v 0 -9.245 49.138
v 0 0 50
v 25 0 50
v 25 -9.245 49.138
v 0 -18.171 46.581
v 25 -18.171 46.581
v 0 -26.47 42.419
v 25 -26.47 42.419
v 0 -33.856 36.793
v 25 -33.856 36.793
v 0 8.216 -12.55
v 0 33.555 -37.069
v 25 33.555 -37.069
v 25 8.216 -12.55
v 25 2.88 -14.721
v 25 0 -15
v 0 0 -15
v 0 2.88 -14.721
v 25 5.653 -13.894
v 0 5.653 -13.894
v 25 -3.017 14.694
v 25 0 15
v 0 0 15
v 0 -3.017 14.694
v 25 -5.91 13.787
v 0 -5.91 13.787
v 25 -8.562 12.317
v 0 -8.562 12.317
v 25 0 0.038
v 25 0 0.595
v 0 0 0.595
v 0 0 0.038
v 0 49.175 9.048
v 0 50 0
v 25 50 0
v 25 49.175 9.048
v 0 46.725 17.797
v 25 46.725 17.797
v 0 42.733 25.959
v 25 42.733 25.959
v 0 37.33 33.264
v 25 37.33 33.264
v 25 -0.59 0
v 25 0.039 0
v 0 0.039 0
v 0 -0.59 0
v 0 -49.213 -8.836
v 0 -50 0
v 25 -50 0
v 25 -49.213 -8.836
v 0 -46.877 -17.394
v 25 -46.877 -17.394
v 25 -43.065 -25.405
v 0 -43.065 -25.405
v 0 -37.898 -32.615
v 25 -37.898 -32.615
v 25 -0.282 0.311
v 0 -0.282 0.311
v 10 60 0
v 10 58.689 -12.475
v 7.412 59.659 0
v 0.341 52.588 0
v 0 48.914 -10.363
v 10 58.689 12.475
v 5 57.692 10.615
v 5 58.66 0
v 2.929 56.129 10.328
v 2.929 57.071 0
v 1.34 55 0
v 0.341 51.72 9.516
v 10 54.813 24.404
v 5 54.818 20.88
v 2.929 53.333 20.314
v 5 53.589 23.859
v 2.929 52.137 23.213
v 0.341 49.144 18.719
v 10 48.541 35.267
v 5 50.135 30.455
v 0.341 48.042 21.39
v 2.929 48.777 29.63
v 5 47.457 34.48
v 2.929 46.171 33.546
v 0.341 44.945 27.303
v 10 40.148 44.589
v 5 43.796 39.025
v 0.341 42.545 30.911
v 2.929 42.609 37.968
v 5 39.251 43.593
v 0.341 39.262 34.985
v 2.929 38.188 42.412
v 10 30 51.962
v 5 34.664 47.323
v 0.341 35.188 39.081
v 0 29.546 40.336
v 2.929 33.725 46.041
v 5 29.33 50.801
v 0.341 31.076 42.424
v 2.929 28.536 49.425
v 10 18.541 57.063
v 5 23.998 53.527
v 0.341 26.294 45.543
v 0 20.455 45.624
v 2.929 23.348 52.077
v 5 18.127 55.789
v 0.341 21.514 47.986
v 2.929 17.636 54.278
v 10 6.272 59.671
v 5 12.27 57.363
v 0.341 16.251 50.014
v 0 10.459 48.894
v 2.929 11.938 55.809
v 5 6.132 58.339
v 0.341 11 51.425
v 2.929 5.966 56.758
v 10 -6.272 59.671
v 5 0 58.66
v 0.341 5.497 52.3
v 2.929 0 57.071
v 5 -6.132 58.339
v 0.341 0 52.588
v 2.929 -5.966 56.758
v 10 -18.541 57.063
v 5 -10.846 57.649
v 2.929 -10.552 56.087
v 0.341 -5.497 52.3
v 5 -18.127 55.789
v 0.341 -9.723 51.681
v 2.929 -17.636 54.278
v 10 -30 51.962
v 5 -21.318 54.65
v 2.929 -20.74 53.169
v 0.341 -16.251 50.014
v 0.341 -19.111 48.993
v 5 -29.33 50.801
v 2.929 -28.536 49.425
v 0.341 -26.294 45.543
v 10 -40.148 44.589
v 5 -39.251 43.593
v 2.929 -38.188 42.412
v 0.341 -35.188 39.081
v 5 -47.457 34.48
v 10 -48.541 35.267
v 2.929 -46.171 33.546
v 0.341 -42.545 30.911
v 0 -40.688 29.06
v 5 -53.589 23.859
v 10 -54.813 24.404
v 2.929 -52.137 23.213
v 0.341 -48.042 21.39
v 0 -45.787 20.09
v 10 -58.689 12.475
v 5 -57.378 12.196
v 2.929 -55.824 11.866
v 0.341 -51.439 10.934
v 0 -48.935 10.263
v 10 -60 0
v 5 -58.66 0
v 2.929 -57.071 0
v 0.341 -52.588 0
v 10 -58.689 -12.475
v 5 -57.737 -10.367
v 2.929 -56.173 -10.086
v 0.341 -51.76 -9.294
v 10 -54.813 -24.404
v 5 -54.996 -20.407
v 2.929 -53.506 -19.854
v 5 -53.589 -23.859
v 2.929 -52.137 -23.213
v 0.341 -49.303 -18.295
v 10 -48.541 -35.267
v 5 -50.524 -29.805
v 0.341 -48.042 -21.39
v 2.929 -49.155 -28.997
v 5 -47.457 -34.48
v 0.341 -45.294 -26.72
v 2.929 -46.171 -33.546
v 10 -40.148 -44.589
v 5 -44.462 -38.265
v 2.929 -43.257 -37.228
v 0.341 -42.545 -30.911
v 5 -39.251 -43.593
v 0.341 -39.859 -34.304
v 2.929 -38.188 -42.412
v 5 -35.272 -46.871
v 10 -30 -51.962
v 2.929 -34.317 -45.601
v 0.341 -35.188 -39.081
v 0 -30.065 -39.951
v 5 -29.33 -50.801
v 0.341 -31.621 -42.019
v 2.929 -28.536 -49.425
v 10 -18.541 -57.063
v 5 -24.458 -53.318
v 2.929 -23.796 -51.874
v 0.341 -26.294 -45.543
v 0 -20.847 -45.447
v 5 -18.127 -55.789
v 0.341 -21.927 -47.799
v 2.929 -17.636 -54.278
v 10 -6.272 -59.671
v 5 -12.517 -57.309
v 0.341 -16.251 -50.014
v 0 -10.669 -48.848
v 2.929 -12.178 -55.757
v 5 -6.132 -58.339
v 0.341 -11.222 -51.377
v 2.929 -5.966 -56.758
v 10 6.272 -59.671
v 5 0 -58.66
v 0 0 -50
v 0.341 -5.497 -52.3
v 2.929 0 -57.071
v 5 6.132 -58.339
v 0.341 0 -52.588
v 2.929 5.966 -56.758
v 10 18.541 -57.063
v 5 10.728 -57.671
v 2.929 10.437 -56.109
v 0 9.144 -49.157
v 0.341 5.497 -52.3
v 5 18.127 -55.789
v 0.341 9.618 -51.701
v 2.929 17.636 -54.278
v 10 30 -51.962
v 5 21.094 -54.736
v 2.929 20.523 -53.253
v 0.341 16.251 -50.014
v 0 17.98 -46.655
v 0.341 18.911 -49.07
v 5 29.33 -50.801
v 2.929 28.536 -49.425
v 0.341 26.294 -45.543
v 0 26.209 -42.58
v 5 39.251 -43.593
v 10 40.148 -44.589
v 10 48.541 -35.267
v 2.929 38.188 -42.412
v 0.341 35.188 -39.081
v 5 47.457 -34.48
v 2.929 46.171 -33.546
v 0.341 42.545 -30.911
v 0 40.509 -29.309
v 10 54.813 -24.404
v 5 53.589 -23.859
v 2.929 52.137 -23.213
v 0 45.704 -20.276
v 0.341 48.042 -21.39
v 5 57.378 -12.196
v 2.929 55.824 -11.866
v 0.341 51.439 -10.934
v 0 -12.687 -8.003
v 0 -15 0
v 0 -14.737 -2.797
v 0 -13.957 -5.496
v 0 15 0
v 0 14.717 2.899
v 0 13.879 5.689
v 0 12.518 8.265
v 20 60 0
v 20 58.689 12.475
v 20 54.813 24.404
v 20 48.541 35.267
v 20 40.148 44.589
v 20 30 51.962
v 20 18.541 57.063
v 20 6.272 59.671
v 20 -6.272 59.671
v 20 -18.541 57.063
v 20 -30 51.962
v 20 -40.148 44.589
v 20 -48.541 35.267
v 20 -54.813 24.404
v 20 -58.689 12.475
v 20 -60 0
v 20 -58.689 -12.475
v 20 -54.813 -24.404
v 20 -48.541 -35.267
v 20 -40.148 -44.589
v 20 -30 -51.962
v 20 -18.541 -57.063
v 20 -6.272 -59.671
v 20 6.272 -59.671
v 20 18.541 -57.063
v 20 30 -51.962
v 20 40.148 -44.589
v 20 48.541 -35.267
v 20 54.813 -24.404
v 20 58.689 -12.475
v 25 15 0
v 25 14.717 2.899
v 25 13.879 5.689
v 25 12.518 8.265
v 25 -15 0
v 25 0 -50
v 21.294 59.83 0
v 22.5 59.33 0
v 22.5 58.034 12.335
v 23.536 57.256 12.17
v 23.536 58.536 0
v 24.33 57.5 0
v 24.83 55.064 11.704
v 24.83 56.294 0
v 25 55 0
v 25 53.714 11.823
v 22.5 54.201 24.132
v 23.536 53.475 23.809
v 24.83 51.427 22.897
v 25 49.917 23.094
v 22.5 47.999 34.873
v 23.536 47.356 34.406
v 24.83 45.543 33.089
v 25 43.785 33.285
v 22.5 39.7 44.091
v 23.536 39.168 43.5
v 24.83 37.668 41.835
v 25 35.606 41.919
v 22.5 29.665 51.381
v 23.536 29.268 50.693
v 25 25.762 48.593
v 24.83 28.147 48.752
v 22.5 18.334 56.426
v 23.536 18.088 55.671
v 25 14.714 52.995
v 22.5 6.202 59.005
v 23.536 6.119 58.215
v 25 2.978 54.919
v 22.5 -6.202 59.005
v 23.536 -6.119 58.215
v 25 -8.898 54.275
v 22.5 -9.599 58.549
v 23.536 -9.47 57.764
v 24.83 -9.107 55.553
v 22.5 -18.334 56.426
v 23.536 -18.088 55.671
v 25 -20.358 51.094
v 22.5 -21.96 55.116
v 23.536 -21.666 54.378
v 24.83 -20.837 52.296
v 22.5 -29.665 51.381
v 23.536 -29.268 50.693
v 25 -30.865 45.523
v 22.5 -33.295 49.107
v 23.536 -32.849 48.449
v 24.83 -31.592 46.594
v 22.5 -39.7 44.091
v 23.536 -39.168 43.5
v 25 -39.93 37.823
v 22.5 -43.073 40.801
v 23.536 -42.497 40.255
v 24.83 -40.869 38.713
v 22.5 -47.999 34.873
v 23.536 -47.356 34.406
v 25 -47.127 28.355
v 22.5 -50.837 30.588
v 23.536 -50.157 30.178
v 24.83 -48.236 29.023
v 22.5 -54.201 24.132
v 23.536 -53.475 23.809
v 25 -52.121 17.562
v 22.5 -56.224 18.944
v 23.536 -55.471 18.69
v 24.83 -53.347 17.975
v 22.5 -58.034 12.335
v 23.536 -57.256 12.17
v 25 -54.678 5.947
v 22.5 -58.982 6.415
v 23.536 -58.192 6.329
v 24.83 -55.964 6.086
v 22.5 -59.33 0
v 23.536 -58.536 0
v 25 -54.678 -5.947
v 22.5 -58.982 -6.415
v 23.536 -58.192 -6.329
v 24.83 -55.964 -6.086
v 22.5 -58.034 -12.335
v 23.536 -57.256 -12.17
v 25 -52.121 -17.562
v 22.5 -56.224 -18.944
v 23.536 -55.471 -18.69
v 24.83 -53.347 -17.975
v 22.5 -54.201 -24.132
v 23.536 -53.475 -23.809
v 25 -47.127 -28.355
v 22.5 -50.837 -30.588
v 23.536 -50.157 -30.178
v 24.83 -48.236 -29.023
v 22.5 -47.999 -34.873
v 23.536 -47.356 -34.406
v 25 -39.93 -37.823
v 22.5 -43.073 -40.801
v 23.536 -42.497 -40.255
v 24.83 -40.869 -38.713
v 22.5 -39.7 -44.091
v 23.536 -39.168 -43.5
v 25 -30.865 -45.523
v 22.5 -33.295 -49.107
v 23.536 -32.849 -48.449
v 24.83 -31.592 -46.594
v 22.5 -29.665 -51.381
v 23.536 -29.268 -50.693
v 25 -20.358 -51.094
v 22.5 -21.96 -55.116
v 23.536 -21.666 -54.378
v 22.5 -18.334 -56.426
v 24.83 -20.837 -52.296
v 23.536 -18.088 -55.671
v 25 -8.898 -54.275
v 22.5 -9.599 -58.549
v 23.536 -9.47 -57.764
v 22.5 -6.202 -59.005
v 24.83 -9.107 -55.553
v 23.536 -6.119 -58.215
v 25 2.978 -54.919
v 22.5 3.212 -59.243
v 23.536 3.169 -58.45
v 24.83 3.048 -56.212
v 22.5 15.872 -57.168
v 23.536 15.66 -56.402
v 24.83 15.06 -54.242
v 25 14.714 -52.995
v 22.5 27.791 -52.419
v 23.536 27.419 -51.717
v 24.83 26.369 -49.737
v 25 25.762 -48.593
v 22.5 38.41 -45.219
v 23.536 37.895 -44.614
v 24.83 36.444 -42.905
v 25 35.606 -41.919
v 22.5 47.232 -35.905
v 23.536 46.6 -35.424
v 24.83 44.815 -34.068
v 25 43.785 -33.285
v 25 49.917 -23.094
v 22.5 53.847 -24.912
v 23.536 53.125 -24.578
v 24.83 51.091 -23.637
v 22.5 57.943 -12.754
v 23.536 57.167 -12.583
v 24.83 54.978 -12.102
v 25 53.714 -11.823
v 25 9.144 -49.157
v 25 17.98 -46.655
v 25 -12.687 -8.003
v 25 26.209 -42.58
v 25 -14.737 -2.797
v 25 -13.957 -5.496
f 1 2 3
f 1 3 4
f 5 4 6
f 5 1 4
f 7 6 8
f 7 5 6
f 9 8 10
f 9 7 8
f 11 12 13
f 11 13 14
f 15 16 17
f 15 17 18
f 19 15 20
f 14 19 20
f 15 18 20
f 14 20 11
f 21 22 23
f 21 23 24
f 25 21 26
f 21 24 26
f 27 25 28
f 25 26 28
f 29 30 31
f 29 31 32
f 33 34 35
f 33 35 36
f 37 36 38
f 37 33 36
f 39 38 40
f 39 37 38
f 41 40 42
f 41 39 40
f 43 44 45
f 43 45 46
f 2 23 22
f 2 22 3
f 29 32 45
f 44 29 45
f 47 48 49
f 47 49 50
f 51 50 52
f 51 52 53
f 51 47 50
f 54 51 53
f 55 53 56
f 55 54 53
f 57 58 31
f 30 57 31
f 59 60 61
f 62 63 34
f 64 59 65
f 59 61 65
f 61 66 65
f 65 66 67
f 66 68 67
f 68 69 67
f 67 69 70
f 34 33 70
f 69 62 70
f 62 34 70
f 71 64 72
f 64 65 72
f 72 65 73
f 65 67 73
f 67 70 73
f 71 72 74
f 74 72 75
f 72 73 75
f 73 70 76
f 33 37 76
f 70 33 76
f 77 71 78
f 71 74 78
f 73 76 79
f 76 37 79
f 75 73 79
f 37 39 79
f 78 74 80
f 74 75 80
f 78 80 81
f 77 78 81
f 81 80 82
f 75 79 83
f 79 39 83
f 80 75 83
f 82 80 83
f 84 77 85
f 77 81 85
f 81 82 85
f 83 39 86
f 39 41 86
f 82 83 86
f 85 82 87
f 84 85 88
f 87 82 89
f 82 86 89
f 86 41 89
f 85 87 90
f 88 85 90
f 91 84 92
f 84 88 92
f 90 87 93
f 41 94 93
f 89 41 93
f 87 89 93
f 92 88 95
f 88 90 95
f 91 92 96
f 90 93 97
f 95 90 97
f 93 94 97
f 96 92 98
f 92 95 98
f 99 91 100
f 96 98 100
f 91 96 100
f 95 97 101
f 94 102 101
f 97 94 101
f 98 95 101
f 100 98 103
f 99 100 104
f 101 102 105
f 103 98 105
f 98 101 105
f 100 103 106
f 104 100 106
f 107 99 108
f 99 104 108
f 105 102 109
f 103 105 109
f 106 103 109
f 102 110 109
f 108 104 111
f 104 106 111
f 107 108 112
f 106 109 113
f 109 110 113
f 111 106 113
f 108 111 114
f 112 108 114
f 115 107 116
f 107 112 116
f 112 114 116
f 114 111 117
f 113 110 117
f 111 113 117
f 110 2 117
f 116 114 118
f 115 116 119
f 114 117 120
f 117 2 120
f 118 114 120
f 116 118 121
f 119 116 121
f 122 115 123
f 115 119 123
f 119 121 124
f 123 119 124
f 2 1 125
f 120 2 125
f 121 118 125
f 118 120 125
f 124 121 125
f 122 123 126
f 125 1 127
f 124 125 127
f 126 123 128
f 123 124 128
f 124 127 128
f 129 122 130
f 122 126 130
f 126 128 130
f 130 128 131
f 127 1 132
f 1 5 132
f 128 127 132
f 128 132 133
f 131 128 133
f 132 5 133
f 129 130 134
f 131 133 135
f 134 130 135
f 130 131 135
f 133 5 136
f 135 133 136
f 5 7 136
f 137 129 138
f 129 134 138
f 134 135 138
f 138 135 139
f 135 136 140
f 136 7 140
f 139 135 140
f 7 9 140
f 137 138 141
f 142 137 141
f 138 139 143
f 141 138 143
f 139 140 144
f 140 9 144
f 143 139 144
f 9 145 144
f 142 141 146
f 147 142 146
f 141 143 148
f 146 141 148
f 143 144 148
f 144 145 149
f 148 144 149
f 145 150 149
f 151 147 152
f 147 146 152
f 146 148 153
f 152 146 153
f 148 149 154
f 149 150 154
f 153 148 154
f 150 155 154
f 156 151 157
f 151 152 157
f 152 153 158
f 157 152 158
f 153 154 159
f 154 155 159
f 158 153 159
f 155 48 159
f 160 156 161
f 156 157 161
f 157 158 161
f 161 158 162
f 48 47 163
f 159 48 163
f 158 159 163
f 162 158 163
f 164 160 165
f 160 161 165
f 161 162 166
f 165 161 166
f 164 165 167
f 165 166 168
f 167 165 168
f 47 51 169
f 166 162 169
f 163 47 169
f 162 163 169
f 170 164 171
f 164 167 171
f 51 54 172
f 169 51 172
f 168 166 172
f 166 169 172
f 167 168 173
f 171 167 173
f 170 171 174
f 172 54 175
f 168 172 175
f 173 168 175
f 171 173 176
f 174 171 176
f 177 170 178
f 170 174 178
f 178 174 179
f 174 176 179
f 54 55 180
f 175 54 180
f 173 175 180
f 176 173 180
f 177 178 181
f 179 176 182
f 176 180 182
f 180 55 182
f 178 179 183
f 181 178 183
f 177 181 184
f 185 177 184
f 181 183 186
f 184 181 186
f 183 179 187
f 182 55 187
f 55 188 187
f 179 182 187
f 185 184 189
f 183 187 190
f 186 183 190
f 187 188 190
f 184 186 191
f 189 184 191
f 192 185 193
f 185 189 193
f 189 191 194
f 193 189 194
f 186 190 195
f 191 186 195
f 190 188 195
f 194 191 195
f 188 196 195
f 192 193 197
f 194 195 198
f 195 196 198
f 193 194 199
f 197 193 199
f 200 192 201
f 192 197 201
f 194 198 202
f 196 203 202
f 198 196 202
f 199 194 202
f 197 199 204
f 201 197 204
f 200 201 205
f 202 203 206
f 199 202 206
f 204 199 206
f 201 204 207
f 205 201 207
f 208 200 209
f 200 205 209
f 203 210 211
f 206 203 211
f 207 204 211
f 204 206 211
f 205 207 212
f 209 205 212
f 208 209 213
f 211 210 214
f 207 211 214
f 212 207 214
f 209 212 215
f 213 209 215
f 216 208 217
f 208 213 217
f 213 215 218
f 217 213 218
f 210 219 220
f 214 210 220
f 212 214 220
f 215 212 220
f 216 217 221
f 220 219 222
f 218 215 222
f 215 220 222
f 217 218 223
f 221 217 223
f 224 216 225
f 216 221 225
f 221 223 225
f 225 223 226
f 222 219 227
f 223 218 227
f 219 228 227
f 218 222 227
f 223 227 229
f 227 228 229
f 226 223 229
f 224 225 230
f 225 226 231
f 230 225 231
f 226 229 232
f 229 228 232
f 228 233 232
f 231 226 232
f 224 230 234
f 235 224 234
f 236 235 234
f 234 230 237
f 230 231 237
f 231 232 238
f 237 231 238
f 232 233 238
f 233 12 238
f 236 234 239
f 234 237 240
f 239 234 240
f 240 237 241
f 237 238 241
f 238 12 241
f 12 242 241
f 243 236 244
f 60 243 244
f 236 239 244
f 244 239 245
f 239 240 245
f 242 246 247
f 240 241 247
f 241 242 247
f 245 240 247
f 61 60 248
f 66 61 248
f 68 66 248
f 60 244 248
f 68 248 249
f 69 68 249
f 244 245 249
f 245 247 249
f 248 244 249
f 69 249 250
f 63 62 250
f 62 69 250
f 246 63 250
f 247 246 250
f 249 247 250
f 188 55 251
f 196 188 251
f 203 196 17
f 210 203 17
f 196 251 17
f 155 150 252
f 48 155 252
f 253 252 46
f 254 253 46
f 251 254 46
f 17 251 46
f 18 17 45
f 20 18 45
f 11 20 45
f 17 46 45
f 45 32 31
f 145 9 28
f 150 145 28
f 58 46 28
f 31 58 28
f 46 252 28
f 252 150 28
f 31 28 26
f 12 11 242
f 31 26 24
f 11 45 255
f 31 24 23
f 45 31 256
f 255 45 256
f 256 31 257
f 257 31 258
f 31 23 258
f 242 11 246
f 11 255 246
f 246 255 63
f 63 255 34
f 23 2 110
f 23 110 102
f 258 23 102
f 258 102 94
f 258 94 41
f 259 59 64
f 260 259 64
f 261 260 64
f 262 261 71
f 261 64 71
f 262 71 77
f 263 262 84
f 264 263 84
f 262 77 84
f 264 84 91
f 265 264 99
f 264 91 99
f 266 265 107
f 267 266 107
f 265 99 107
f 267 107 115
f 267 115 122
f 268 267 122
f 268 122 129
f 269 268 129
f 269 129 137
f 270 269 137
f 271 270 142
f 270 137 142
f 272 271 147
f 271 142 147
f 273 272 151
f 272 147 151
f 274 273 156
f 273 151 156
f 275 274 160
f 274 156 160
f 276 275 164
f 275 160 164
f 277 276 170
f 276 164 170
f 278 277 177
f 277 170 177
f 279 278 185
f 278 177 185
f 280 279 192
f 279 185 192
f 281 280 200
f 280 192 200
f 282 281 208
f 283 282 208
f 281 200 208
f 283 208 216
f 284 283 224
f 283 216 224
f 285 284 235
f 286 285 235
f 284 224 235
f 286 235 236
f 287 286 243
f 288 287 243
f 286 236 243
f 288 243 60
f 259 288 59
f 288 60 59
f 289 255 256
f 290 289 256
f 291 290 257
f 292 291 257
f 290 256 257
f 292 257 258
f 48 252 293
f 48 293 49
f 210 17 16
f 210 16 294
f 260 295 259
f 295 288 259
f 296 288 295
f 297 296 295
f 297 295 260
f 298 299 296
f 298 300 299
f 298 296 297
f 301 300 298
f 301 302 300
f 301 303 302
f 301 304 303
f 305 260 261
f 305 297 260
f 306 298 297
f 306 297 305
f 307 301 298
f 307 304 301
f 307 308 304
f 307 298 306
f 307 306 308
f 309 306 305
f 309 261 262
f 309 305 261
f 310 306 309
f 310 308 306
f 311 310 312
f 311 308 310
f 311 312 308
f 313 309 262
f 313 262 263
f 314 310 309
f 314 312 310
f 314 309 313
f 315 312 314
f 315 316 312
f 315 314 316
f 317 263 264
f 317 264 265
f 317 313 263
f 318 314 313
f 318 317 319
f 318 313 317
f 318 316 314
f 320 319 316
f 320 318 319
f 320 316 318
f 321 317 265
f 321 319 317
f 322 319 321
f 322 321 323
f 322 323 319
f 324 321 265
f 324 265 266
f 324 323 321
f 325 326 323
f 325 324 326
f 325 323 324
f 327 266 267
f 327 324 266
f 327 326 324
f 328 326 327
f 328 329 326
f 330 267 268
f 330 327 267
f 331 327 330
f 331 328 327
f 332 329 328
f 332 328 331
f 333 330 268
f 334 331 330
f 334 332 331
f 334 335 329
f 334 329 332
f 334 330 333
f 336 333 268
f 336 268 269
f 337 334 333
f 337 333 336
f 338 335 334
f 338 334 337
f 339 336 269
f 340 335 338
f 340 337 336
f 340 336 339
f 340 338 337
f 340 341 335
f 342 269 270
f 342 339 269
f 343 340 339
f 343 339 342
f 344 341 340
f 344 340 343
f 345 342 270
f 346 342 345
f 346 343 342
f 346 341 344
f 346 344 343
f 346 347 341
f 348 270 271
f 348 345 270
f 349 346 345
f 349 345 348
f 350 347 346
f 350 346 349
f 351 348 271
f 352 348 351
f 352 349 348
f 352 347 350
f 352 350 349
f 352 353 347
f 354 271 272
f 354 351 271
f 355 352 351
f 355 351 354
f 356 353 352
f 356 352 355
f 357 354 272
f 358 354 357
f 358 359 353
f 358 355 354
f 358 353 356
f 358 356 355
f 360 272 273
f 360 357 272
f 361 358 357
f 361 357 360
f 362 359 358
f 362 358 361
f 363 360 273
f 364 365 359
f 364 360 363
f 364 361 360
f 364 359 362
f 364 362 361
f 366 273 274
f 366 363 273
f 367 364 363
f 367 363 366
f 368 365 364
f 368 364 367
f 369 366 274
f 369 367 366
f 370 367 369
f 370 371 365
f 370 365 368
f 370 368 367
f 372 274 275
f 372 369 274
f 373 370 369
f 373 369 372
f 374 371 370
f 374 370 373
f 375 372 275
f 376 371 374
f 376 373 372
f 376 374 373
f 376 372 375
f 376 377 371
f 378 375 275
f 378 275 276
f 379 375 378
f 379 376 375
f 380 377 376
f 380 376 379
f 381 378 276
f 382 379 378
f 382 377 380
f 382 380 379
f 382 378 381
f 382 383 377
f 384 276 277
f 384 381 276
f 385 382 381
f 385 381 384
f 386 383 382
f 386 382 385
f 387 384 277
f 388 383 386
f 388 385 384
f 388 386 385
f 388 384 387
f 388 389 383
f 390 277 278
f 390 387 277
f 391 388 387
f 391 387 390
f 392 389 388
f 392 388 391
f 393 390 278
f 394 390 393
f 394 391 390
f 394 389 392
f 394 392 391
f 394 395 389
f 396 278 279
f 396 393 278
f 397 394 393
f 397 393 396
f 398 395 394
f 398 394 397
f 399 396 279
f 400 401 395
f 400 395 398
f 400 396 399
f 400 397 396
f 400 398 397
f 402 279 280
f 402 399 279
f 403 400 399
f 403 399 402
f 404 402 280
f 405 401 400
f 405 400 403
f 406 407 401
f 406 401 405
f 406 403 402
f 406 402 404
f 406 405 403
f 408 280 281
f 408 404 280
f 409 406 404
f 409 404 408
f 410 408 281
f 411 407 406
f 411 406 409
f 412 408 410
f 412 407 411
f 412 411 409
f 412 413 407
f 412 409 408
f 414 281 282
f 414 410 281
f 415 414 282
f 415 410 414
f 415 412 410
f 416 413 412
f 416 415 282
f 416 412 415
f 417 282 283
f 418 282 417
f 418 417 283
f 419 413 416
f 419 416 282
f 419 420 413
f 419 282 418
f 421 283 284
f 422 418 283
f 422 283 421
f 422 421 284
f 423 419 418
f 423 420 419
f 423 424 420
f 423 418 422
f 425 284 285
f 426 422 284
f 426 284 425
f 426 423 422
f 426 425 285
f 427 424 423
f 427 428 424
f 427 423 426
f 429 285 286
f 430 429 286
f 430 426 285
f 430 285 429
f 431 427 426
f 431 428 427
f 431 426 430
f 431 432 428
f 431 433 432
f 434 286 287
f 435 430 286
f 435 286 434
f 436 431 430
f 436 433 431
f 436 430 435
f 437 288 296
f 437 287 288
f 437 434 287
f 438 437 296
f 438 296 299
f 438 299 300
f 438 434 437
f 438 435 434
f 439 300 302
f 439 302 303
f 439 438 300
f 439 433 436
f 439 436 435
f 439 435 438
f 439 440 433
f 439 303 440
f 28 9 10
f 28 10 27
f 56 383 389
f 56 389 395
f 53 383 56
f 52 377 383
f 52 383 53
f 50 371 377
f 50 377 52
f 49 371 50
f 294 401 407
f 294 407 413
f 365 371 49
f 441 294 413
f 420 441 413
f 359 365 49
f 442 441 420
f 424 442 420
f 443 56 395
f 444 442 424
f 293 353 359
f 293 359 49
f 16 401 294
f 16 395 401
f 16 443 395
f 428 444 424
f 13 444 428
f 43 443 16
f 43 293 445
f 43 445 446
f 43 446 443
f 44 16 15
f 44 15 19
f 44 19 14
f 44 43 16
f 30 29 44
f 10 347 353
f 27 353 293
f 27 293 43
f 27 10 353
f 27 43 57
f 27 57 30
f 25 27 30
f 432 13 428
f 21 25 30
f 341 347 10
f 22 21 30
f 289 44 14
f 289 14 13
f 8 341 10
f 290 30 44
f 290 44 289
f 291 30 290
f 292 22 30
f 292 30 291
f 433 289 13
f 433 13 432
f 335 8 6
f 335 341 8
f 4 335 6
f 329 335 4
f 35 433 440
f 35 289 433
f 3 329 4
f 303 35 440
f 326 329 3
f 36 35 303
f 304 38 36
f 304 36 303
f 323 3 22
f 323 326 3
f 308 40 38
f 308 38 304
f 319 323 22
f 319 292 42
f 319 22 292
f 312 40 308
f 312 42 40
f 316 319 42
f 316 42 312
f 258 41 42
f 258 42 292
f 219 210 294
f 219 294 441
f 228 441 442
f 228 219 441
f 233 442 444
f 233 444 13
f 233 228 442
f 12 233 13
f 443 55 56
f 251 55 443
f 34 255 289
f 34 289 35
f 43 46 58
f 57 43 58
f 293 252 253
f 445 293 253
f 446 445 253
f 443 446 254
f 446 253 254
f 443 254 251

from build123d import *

# Parameters (mm, degrees)
F0_R     = 60
F0_R_2   = 55
F1_DEPTH = 25
F2_R     = 5
F3_R     = 10
F4_DEPTH = 25
F5_DEPTH = 25


with BuildPart() as f1:
    # F0 (on Right) → F1 (new body)
    with BuildSketch(Plane.YZ):
        Circle(F0_R)
        Circle(F0_R_2, mode=Mode.SUBTRACT)
        Circle(F0_R_2)
        with BuildLine():
            ThreePointArc((37.3300225605, 33.2636350333), (46.7252668694, 17.7974558852), (50, 0))
            ThreePointArc((50, 0), (46.3547535543, -18.7413132657), (35.9505270831, -34.7499583085))
            ThreePointArc((35.9505270831, -34.7499583085), (34.7719029265, -35.9293023432), (33.5546123129, -37.0686928894))
            ThreePointArc((33.5546123129, -37.0686928894), (17.9800633415, -46.6553032595), (0, -50))
            ThreePointArc((0, -50), (-19.2409733878, -46.1495930978), (-35.5185237062, -35.1913977235))
            ThreePointArc((-35.5185237062, -35.1913977235), (-36.7306636988, -33.9243031505), (-37.8976277369, -32.6154842355))
            ThreePointArc((-37.8976277369, -32.6154842355), (-46.8768673593, -17.3942319916), (-50, 0))
            ThreePointArc((-50, 0), (-46.3446390349, 18.7663111114), (-35.9130226909, 34.7887165789))
            ThreePointArc((-35.9130226909, 34.7887165789), (-34.8991240146, 35.8057417605), (-33.8564359237, 36.7932296292))
            ThreePointArc((-33.8564359237, 36.7932296292), (-18.1705602354, 46.5814420207), (0, 50))
            ThreePointArc((0, 50), (1.5278005192, 49.9766528048), (3.054174244, 49.9066330229))
            ThreePointArc((3.054174244, 49.9066330229), (20.2598113498, 45.7114870035), (34.923788683, 35.7816850362))
            ThreePointArc((34.923788683, 35.7816850362), (36.148837516, 34.5436180248), (37.3300225605, 33.2636350333))
        make_face(mode=Mode.SUBTRACT)
        with BuildLine():
            ThreePointArc((-35.5185237062, -35.1913977235), (-19.2409733878, -46.1495930978), (0, -50))
            Line((0, -50), (0, -15))
            ThreePointArc((0, -15), (-5.9073859905, -13.7877768607), (-10.8599626488, -10.347038768))
            Line((-10.8599626488, -10.347038768), (-35.5185237062, -35.1913977235))
        make_face()
        with BuildLine():
            Line((-10.7607644181, 10.4501650292), (-35.9130226909, 34.7887165789))
            ThreePointArc((-35.9130226909, 34.7887165789), (-46.3446390349, 18.7663111114), (-50, 0))
            Line((-50, 0), (-15, 0))
            ThreePointArc((-15, 0), (-13.8998465148, 5.6386405156), (-10.7607644181, 10.4501650292))
        make_face()
        with BuildLine():
            ThreePointArc((35.9505270831, -34.7499583085), (46.3547535543, -18.7413132657), (50, 0))
            Line((50, 0), (15, 0))
            ThreePointArc((15, 0), (13.909961038, -5.6136426607), (10.7982688104, -10.4114067589))
            Line((10.7982688104, -10.4114067589), (35.9505270831, -34.7499583085))
        make_face()
        with BuildLine():
            Line((0, 15), (0, 50))
            ThreePointArc((0, 50), (-18.1705602354, 46.5814420207), (-33.8564359237, 36.7932296292))
            Line((-33.8564359237, 36.7932296292), (-8.5615410762, 12.3166559748))
            ThreePointArc((-8.5615410762, 12.3166559748), (-4.4860985488, 14.3134524071), (0, 15))
        make_face()
        with BuildLine():
            ThreePointArc((0, -50), (17.9800633415, -46.6553032595), (33.5546123129, -37.0686928894))
            Line((33.5546123129, -37.0686928894), (8.2159867451, -12.5498032576))
            ThreePointArc((8.2159867451, -12.5498032576), (4.2867791601, -14.3744051853), (0, -15))
            Line((0, -15), (0, -50))
        make_face()
        with BuildLine():
            Line((15, 0), (50, 0))
            ThreePointArc((50, 0), (46.7252668694, 17.7974558852), (37.3300225605, 33.2636350333))
            Line((37.3300225605, 33.2636350333), (12.5178824574, 8.264539841))
            ThreePointArc((12.5178824574, 8.264539841), (14.3660752619, 4.3146125631), (15, 0))
        make_face()
        with BuildLine():
            ThreePointArc((-50, 0), (-46.8768673593, -17.3942319916), (-37.8976277369, -32.6154842355))
            Line((-37.8976277369, -32.6154842355), (-12.6869769146, -8.0025381453))
            ThreePointArc((-12.6869769146, -8.0025381453), (-14.4101466634, -4.165053798), (-15, 0))
            Line((-15, 0), (-50, 0))
        make_face()
        with BuildLine():
            Line((10.2652276257, 10.9373260806), (34.923788683, 35.7816850362))
            ThreePointArc((34.923788683, 35.7816850362), (20.2598113498, 45.7114870035), (3.054174244, 49.9066330229))
            Line((3.054174244, 49.9066330229), (3.054174244, 14.6857761009))
            ThreePointArc((3.054174244, 14.6857761009), (6.9184055916, 13.309232287), (10.2652276257, 10.9373260806))
        make_face()
        with BuildLine():
            Line((12.5178824574, 8.264539841), (37.3300225605, 33.2636350333))
            ThreePointArc((37.3300225605, 33.2636350333), (36.148837516, 34.5436180248), (34.923788683, 35.7816850362))
            Line((34.923788683, 35.7816850362), (10.2652276257, 10.9373260806))
            ThreePointArc((10.2652276257, 10.9373260806), (11.4696762306, 9.666774393), (12.5178824574, 8.264539841))
        make_face()
        with BuildLine():
            ThreePointArc((33.5546123129, -37.0686928894), (34.7719029265, -35.9293023432), (35.9505270831, -34.7499583085))
            Line((35.9505270831, -34.7499583085), (10.7982688104, -10.4114067589))
            ThreePointArc((10.7982688104, -10.4114067589), (9.5670613815, -11.5529795517), (8.2159867451, -12.5498032576))
            Line((8.2159867451, -12.5498032576), (33.5546123129, -37.0686928894))
        make_face()
        with BuildLine():
            ThreePointArc((-37.8976277369, -32.6154842355), (-36.7306636988, -33.9243031505), (-35.5185237062, -35.1913977235))
            Line((-35.5185237062, -35.1913977235), (-10.8599626488, -10.347038768))
            ThreePointArc((-10.8599626488, -10.347038768), (-11.8316846431, -9.2201539307), (-12.6869769146, -8.0025381453))
            Line((-12.6869769146, -8.0025381453), (-37.8976277369, -32.6154842355))
        make_face()
        with BuildLine():
            Line((3.054174244, 14.6857761009), (3.054174244, 49.9066330229))
            ThreePointArc((3.054174244, 49.9066330229), (1.5278005192, 49.9766528048), (0, 50))
            Line((0, 50), (0, 15))
            ThreePointArc((0, 15), (1.5351479547, 14.9212372395), (3.054174244, 14.6857761009))
        make_face()
        with BuildLine():
            Line((-8.5615410762, 12.3166559748), (-33.8564359237, 36.7932296292))
            ThreePointArc((-33.8564359237, 36.7932296292), (-34.8991240146, 35.8057417605), (-35.9130226909, 34.7887165789))
            Line((-35.9130226909, 34.7887165789), (-10.7607644181, 10.4501650292))
            ThreePointArc((-10.7607644181, 10.4501650292), (-9.7061227849, 11.4363971811), (-8.5615410762, 12.3166559748))
        make_face()
    extrude(amount=F1_DEPTH)

    # F2
    f2_edges = [f1.edges().sort_by_distance(p)[0] for p in [
        (25, -60, 0),
    ]]
    fillet(f2_edges, radius=F2_R)

    # F3
    f3_edges = [f1.edges().sort_by_distance(p)[0] for p in [
        (0, -60, 0),
    ]]
    fillet(f3_edges, radius=F3_R)

    # F0 (on Right) → F4 (cut, through all)
    with BuildSketch(Plane.YZ):
        with BuildLine():
            Line((0, 15), (0, 50))
            ThreePointArc((0, 50), (-18.1705602354, 46.5814420207), (-33.8564359237, 36.7932296292))
            Line((-33.8564359237, 36.7932296292), (-8.5615410762, 12.3166559748))
            ThreePointArc((-8.5615410762, 12.3166559748), (-4.4860985488, 14.3134524071), (0, 15))
        make_face()
        with BuildLine():
            ThreePointArc((-50, 0), (-46.8768673593, -17.3942319916), (-37.8976277369, -32.6154842355))
            Line((-37.8976277369, -32.6154842355), (-12.6869769146, -8.0025381453))
            ThreePointArc((-12.6869769146, -8.0025381453), (-14.4101466634, -4.165053798), (-15, 0))
            Line((-15, 0), (-50, 0))
        make_face()
        with BuildLine():
            ThreePointArc((0, -50), (17.9800633415, -46.6553032595), (33.5546123129, -37.0686928894))
            Line((33.5546123129, -37.0686928894), (8.2159867451, -12.5498032576))
            ThreePointArc((8.2159867451, -12.5498032576), (4.2867791601, -14.3744051853), (0, -15))
            Line((0, -15), (0, -50))
        make_face()
        with BuildLine():
            Line((15, 0), (50, 0))
            ThreePointArc((50, 0), (46.7252668694, 17.7974558852), (37.3300225605, 33.2636350333))
            Line((37.3300225605, 33.2636350333), (12.5178824574, 8.264539841))
            ThreePointArc((12.5178824574, 8.264539841), (14.3660752619, 4.3146125631), (15, 0))
        make_face()
    extrude(amount=F4_DEPTH, mode=Mode.SUBTRACT)

    # F0 (on Right) → F5 (join)
    with BuildSketch(Plane.YZ):
        with BuildLine():
            ThreePointArc((10.7982688104, -10.4114067589), (13.909961038, -5.6136426607), (15, 0))
            ThreePointArc((15, 0), (14.3660752619, 4.3146125631), (12.5178824574, 8.264539841))
            ThreePointArc((12.5178824574, 8.264539841), (11.4696762306, 9.666774393), (10.2652276257, 10.9373260806))
            ThreePointArc((10.2652276257, 10.9373260806), (6.9184055916, 13.309232287), (3.054174244, 14.6857761009))
            ThreePointArc((3.054174244, 14.6857761009), (1.5351479547, 14.9212372395), (0, 15))
            ThreePointArc((0, 15), (-4.4860985488, 14.3134524071), (-8.5615410762, 12.3166559748))
            ThreePointArc((-8.5615410762, 12.3166559748), (-9.7061227849, 11.4363971811), (-10.7607644181, 10.4501650292))
            ThreePointArc((-10.7607644181, 10.4501650292), (-13.8998465148, 5.6386405156), (-15, 0))
            ThreePointArc((-15, 0), (-14.4101466634, -4.165053798), (-12.6869769146, -8.0025381453))
            ThreePointArc((-12.6869769146, -8.0025381453), (-11.8316846431, -9.2201539307), (-10.8599626488, -10.347038768))
            ThreePointArc((-10.8599626488, -10.347038768), (-5.9073859905, -13.7877768607), (0, -15))
            ThreePointArc((0, -15), (4.2867791601, -14.3744051853), (8.2159867451, -12.5498032576))
            ThreePointArc((8.2159867451, -12.5498032576), (9.5670613815, -11.5529795517), (10.7982688104, -10.4114067589))
        make_face()
        Polygon((-0.2821140827, 0.3105120171), (0, 0.5947517795), (0, 0.0375246745), (0.0387792307, 0), (0, 0), (-0.5903039437, 0), align=None, mode=Mode.SUBTRACT)
    extrude(amount=F5_DEPTH)


solid = f1.part
